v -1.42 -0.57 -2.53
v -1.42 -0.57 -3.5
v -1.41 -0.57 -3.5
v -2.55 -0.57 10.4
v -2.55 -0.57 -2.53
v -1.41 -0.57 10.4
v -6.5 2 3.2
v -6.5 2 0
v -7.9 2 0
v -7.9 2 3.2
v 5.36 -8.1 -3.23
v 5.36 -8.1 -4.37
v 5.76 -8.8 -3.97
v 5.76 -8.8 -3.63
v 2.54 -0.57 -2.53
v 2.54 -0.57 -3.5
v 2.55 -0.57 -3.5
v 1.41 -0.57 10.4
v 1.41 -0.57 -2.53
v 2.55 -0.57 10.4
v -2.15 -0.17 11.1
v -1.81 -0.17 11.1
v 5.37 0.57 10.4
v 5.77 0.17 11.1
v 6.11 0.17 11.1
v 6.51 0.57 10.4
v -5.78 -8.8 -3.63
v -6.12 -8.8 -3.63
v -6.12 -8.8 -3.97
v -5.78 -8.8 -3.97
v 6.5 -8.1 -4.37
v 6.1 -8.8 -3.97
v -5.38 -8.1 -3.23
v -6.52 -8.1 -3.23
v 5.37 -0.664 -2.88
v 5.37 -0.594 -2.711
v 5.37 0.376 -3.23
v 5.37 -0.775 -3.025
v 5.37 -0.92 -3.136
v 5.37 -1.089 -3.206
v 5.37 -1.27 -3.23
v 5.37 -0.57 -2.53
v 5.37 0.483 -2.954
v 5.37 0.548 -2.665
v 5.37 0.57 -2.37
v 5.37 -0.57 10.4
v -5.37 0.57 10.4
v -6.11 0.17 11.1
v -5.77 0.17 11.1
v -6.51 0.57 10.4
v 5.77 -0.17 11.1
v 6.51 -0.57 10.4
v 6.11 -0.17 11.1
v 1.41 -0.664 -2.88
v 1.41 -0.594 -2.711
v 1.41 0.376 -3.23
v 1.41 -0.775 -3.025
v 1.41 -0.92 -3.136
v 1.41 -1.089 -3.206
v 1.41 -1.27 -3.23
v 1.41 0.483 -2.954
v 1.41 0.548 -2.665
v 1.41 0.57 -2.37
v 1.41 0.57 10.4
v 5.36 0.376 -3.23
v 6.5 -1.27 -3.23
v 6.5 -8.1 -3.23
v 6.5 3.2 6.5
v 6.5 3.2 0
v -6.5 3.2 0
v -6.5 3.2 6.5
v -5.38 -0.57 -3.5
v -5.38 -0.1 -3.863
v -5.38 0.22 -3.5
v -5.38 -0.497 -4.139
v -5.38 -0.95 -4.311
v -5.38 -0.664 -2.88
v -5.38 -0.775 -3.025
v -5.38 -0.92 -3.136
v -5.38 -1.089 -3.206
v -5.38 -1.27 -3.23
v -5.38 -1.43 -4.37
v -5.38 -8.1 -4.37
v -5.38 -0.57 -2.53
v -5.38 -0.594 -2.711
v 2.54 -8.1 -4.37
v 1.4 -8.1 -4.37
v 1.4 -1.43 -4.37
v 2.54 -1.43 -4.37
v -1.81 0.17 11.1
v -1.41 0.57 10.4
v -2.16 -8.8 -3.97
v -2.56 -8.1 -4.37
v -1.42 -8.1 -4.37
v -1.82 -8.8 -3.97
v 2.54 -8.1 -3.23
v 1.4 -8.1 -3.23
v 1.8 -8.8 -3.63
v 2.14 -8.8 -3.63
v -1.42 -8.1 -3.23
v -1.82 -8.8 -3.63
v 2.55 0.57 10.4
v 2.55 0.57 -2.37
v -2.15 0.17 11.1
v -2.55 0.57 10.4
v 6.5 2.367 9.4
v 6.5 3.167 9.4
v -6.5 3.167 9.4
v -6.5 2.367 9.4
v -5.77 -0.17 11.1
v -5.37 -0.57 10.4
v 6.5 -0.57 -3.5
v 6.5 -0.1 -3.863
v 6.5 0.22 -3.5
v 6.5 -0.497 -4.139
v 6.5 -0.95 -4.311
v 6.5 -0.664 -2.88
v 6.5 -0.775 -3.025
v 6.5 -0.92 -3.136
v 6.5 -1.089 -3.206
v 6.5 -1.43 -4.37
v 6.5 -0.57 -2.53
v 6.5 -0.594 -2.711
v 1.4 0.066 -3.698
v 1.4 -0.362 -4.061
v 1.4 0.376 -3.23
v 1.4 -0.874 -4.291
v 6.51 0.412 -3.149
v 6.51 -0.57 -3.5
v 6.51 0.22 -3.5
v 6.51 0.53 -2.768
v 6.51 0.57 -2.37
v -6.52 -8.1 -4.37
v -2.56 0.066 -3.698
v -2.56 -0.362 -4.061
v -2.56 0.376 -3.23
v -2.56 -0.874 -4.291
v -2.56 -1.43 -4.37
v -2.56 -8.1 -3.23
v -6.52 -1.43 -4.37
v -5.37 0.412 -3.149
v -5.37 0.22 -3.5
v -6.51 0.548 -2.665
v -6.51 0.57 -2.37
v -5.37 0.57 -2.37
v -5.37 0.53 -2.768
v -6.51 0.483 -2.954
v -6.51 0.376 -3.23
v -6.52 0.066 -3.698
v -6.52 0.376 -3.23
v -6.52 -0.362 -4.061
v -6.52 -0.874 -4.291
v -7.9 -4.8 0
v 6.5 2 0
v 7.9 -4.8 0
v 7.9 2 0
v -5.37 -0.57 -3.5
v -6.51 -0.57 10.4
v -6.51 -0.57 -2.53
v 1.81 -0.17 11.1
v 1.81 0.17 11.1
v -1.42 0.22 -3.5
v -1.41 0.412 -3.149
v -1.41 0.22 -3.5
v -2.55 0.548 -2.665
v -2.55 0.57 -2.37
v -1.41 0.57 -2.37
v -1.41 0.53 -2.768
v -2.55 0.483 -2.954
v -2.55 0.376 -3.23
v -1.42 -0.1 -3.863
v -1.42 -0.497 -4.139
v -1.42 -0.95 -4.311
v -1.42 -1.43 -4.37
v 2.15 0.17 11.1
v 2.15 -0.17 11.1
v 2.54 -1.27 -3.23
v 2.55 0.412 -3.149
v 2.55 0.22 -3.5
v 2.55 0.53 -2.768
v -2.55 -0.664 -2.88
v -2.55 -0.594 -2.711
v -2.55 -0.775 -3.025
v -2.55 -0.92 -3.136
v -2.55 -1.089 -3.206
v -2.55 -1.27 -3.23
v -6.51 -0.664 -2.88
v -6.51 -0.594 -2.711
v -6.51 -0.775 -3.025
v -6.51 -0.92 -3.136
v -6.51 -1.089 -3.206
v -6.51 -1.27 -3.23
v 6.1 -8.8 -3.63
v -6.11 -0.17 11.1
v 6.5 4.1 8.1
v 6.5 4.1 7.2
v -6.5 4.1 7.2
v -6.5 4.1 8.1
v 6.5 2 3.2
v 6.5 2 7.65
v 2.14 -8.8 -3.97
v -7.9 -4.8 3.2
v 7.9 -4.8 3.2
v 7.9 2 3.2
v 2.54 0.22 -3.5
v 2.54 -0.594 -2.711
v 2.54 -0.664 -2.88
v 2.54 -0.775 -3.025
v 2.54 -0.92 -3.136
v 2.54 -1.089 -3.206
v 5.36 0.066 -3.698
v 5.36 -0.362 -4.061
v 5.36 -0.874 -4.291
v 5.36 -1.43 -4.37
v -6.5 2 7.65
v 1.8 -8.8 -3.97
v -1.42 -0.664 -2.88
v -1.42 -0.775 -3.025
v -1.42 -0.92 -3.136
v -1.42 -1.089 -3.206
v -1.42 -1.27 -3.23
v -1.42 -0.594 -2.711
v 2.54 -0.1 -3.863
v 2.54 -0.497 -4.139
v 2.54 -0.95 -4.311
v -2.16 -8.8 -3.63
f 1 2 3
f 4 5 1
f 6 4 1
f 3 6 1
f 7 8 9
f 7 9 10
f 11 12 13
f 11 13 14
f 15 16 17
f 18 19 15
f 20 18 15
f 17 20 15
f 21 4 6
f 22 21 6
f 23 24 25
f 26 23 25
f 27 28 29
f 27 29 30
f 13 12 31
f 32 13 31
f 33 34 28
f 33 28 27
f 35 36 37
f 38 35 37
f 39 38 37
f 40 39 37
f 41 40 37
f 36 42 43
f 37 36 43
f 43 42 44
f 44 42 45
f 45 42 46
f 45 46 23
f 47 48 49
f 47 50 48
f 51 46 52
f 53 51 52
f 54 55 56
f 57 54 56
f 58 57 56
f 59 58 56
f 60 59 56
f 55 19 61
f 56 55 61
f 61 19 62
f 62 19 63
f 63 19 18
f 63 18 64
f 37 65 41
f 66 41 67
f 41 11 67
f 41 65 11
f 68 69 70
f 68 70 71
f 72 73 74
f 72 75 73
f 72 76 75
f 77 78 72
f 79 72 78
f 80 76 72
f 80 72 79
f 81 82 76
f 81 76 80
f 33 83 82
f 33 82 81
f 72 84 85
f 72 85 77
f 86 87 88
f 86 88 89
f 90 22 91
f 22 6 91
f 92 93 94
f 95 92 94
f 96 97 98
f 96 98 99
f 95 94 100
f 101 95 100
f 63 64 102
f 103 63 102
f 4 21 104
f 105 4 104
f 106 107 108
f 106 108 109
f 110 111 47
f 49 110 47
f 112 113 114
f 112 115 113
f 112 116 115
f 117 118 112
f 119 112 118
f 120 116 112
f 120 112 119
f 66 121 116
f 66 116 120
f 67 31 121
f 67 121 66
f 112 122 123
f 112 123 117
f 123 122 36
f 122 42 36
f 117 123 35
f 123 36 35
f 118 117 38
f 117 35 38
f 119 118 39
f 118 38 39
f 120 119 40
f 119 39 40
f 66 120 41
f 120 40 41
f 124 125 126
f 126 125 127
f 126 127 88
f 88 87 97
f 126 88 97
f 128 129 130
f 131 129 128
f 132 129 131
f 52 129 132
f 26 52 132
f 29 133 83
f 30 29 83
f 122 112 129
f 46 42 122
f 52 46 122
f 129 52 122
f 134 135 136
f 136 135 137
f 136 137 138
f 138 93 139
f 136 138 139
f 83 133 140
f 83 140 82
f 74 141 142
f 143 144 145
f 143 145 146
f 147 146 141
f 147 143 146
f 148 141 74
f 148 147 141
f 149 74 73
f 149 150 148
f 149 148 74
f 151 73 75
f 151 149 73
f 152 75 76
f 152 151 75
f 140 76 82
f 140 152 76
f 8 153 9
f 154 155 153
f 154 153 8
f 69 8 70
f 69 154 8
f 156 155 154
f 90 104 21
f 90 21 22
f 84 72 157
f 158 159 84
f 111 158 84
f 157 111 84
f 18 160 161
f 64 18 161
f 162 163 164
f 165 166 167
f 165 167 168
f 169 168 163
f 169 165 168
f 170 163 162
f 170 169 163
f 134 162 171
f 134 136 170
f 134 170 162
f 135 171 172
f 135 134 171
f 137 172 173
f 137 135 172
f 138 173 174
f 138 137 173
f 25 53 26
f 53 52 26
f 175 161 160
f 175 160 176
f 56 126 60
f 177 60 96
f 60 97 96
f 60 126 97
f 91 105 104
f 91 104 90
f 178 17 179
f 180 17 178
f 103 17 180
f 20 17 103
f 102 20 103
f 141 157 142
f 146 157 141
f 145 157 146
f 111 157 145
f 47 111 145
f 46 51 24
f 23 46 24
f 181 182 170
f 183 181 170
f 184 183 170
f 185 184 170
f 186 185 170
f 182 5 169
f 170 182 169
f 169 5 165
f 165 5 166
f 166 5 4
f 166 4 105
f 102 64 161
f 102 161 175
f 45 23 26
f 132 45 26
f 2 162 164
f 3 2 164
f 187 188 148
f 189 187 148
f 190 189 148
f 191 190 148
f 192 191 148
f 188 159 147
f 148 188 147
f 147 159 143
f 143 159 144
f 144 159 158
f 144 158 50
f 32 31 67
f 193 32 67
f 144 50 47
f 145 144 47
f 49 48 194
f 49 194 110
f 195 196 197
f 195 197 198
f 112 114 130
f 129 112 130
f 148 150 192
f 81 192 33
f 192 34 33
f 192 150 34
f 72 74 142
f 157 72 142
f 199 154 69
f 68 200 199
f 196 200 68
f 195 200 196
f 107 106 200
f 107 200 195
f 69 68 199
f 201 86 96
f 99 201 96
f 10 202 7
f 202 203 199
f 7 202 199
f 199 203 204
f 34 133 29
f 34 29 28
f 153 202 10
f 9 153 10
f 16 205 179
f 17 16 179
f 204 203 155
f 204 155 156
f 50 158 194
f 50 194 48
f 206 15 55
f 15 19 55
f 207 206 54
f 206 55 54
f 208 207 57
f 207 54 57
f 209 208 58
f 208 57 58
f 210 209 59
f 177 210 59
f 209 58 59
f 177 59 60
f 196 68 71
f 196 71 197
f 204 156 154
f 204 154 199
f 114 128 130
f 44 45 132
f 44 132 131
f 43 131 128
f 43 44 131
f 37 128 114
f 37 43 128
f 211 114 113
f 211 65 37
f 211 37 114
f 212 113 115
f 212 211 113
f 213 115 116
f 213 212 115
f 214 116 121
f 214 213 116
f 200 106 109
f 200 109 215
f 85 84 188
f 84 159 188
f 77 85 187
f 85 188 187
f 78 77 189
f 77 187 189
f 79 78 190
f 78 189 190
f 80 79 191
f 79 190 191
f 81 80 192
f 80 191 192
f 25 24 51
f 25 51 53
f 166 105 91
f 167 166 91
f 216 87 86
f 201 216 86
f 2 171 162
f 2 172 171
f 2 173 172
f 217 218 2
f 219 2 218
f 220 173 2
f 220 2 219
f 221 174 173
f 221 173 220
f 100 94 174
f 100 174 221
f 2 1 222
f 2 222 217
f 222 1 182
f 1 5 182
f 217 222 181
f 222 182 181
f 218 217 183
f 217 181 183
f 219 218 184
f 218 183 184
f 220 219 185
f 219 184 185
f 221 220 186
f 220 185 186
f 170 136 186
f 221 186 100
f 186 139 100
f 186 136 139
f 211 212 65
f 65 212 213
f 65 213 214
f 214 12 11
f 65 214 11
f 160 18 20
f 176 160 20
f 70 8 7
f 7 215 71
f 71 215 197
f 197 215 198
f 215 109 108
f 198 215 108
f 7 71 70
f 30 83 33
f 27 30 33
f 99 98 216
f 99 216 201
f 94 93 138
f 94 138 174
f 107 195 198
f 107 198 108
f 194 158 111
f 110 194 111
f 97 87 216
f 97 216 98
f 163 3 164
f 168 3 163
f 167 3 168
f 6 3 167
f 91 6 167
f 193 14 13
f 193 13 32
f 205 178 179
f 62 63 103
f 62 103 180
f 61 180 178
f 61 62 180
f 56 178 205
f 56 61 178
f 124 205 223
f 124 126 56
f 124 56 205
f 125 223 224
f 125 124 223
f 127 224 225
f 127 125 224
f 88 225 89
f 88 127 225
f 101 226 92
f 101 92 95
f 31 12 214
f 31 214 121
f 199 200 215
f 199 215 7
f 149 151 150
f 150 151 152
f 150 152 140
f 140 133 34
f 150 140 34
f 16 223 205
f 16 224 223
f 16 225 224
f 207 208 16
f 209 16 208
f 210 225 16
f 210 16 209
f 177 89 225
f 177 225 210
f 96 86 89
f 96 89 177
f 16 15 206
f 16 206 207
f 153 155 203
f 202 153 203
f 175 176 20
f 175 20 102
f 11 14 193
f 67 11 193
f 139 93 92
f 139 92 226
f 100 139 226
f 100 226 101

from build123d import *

# Parameters (mm, degrees)
F0_W          = 6.8
F0_H          = 3.2
F1_DEPTH      = 7.9
F1_DEPTH_BACK = 7.9
F2_DEPTH      = 6.5
F2_DEPTH_BACK = 6.5
F3_W          = 1.14
F3_H          = 1.14
F4_DEPTH      = 11.1
F4_DEPTH_BACK = 3.5
F5_C1_SIZE2   = 0.4
F5_C1_SIZE    = 0.7
F5_C2_SIZE2   = 0.7
F5_C2_SIZE    = 0.4
F5_C3_SIZE2   = 0.7
F5_C3_SIZE    = 0.4
F5_C4_SIZE2   = 0.7
F5_C4_SIZE    = 0.4
F5_2_C1_SIZE2 = 0.4
F5_2_C1_SIZE  = 0.7
F5_2_C2_SIZE2 = 0.7
F5_2_C2_SIZE  = 0.4
F5_2_C3_SIZE2 = 0.7
F5_2_C3_SIZE  = 0.4
F5_2_C4_SIZE2 = 0.7
F5_2_C4_SIZE  = 0.4
F5_3_C1_SIZE2 = 0.4
F5_3_C1_SIZE  = 0.7
F5_3_C2_SIZE2 = 0.7
F5_3_C2_SIZE  = 0.4
F5_3_C3_SIZE2 = 0.7
F5_3_C3_SIZE  = 0.4
F5_3_C4_SIZE2 = 0.7
F5_3_C4_SIZE  = 0.4
F5_4_C1_SIZE2 = 0.4
F5_4_C1_SIZE  = 0.7
F5_4_C2_SIZE2 = 0.7
F5_4_C2_SIZE  = 0.4
F5_4_C3_SIZE2 = 0.7
F5_4_C3_SIZE  = 0.4
F5_4_C4_SIZE2 = 0.7
F5_4_C4_SIZE  = 0.4
F6_W          = 1.14
F6_H          = 1.14
F7_DEPTH      = 8.8
F7_DEPTH_BACK = 0.57
F8_R          = 0.7
F8_2_R        = 0.7
F8_3_R        = 0.7
F8_4_R        = 0.7
F9_T1_DEPTH   = 11.14
F9_2_T1_DEPTH = 11.14
F9_3_T1_DEPTH = 11.14
F9_4_T1_DEPTH = 11.14
F10_SIZE2     = 0.7
F10_SIZE      = 0.4
F10_2_SIZE2   = 0.7
F10_2_SIZE    = 0.4
F10_3_SIZE2   = 0.7
F10_3_SIZE    = 0.4
F10_4_SIZE2   = 0.7
F10_4_SIZE    = 0.4


# Not quite as in the source:
# - a fillet or chamfer that OpenCascade refuses, or shapes differently, is made with other operations: its cross-section is extruded or revolved along the edge and cut away or added


with BuildPart() as f1:
    # F0 (on Right) → F1 (new body, two sides)
    with BuildSketch(Plane.YZ) as f1_sk:
        with Locations((-1.4, 1.6)):
            Rectangle(F0_W, F0_H)
    extrude(amount=F1_DEPTH)
    extrude(f1_sk.sketch, amount=-F1_DEPTH_BACK)

    # F0 (on Right) → F2 (join, two sides)
    with BuildSketch(Plane.YZ) as f2_sk:
        Polygon((2, 3.2), (2, 0), (3.2, 0), (3.2, 6.5), (4.1, 7.2), (4.1, 8.1), (3.1672620947, 9.4), (2.3672620947, 9.4), (2, 7.65), align=None)
    extrude(amount=F2_DEPTH)
    extrude(f2_sk.sketch, amount=-F2_DEPTH_BACK)


with BuildPart() as f4:
    # F3 (on Top) → F4 (new body, two sides)
    with BuildSketch(Plane.XY) as f4_sk:
        with Locations((-5.94, 0)):
            Rectangle(F3_W, F3_H)
    extrude(amount=F4_DEPTH)
    extrude(f4_sk.sketch, amount=-F4_DEPTH_BACK)

    # F5: chamfer of 0.7 x 0.4 on 4 edges, made by hand

    # F5_c1
    f5_c1_edges = [f4.edges().sort_by_distance(p)[0] for p in [
        (-5.94, -0.57, 11.1),
    ]]
    f5_c1_side = f4.faces().sort_by_distance((-5.94, -0.57, 11.092))[0]
    chamfer(f5_c1_edges, length=F5_C1_SIZE, length2=F5_C1_SIZE2, reference=f5_c1_side)

    # F5_c2
    f5_c2_edges = [f4.edges().sort_by_distance(p)[0] for p in [
        (-5.94, 0.57, 11.1),
    ]]
    f5_c2_side = f4.faces().sort_by_distance((-5.94, 0.562, 11.1))[0]
    chamfer(f5_c2_edges, length=F5_C2_SIZE, length2=F5_C2_SIZE2, reference=f5_c2_side)

    # F5_c3
    f5_c3_edges = [f4.edges().sort_by_distance(p)[0] for p in [
        (-5.37, 0, 11.1),
    ]]
    f5_c3_side = f4.faces().sort_by_distance((-5.378, 0, 11.1))[0]
    chamfer(f5_c3_edges, length=F5_C3_SIZE, length2=F5_C3_SIZE2, reference=f5_c3_side)

    # F5_c4
    f5_c4_edges = [f4.edges().sort_by_distance(p)[0] for p in [
        (-6.51, 0, 11.1),
    ]]
    f5_c4_side = f4.faces().sort_by_distance((-6.502, 0, 11.1))[0]
    chamfer(f5_c4_edges, length=F5_C4_SIZE, length2=F5_C4_SIZE2, reference=f5_c4_side)

    # F6 (on Front) → F7, piece 4 (join, two sides)
    with BuildSketch(Plane.XZ) as f7_4_sk:
        with Locations((-5.95, -3.8)):
            Rectangle(F6_W, F6_H)
    extrude(amount=F7_DEPTH)
    extrude(f7_4_sk.sketch, amount=-F7_DEPTH_BACK)

    # F8
    f8_edges = [f4.edges().sort_by_distance(p)[0] for p in [
        (-5.945, -0.57, -3.23),
    ]]
    fillet(f8_edges, radius=F8_R)

    # F9: fillet of radius 2 on 1 edges, made by hand

    # F9_s2 → F9_t1 (cut)
    with BuildSketch(Plane.YZ.offset(-11.52)):
        with BuildLine():
            ThreePointArc((0.57, -2.37), (-0.0157864376, -3.7842135624), (-1.43, -4.37))
            Line((-1.43, -4.37), (0.57, -4.37))
            Line((0.57, -4.37), (0.57, -2.37))
        make_face()
    extrude(amount=F9_T1_DEPTH, mode=Mode.SUBTRACT)

    # F10
    f10_edges = [f4.edges().sort_by_distance(p)[0] for p in [
        (-5.38, -8.8, -3.8),
        (-5.95, -8.8, -3.23),
        (-6.52, -8.8, -3.8),
        (-5.95, -8.8, -4.37),
    ]]
    f10_side = f4.faces().sort_by_distance((-5.95, -8.8, -3.8))[0]
    chamfer(f10_edges, length=F10_SIZE, length2=F10_SIZE2, reference=f10_side)


with BuildPart() as f4b:
    # F3 (on Top) → F4, piece 2 (new body, two sides)
    with BuildSketch(Plane.XY) as f4_2_sk:
        with Locations((-1.98, 0)):
            Rectangle(F3_W, F3_H)
    extrude(amount=F4_DEPTH)
    extrude(f4_2_sk.sketch, amount=-F4_DEPTH_BACK)

    # F5#2: chamfer of 0.7 x 0.4 on 4 edges, made by hand

    # F5_2_c1
    f5_2_c1_edges = [f4b.edges().sort_by_distance(p)[0] for p in [
        (-2.55, 0, 11.1),
    ]]
    f5_2_c1_side = f4b.faces().sort_by_distance((-2.55, 0, 11.092))[0]
    chamfer(f5_2_c1_edges, length=F5_2_C1_SIZE, length2=F5_2_C1_SIZE2, reference=f5_2_c1_side)

    # F5_2_c2
    f5_2_c2_edges = [f4b.edges().sort_by_distance(p)[0] for p in [
        (-1.41, 0, 11.1),
    ]]
    f5_2_c2_side = f4b.faces().sort_by_distance((-1.418, 0, 11.1))[0]
    chamfer(f5_2_c2_edges, length=F5_2_C2_SIZE, length2=F5_2_C2_SIZE2, reference=f5_2_c2_side)

    # F5_2_c3
    f5_2_c3_edges = [f4b.edges().sort_by_distance(p)[0] for p in [
        (-1.98, -0.57, 11.1),
    ]]
    f5_2_c3_side = f4b.faces().sort_by_distance((-1.98, -0.562, 11.1))[0]
    chamfer(f5_2_c3_edges, length=F5_2_C3_SIZE, length2=F5_2_C3_SIZE2, reference=f5_2_c3_side)

    # F5_2_c4
    f5_2_c4_edges = [f4b.edges().sort_by_distance(p)[0] for p in [
        (-1.98, 0.57, 11.1),
    ]]
    f5_2_c4_side = f4b.faces().sort_by_distance((-1.98, 0.562, 11.1))[0]
    chamfer(f5_2_c4_edges, length=F5_2_C4_SIZE, length2=F5_2_C4_SIZE2, reference=f5_2_c4_side)

    # F6 (on Front) → F7, piece 3 (join, two sides)
    with BuildSketch(Plane.XZ) as f7_3_sk:
        with Locations((-1.99, -3.8)):
            Rectangle(F6_W, F6_H)
    extrude(amount=F7_DEPTH)
    extrude(f7_3_sk.sketch, amount=-F7_DEPTH_BACK)

    # F8#2
    f8_2_edges = [f4b.edges().sort_by_distance(p)[0] for p in [
        (-1.985, -0.57, -3.23),
    ]]
    fillet(f8_2_edges, radius=F8_2_R)

    # F9#2: fillet of radius 2 on 1 edges, made by hand

    # F9_2_s2 → F9_2_t1 (cut)
    with BuildSketch(Plane.YZ.offset(-7.56)):
        with BuildLine():
            ThreePointArc((0.57, -2.37), (-0.0157864376, -3.7842135624), (-1.43, -4.37))
            Line((-1.43, -4.37), (0.57, -4.37))
            Line((0.57, -4.37), (0.57, -2.37))
        make_face()
    extrude(amount=F9_2_T1_DEPTH, mode=Mode.SUBTRACT)

    # F10#2
    f10_2_edges = [f4b.edges().sort_by_distance(p)[0] for p in [
        (-1.42, -8.8, -3.8),
        (-1.99, -8.8, -3.23),
        (-2.56, -8.8, -3.8),
        (-1.99, -8.8, -4.37),
    ]]
    f10_2_side = f4b.faces().sort_by_distance((-1.99, -8.8, -3.8))[0]
    chamfer(f10_2_edges, length=F10_2_SIZE, length2=F10_2_SIZE2, reference=f10_2_side)


with BuildPart() as f4c:
    # F3 (on Top) → F4, piece 3 (new body, two sides)
    with BuildSketch(Plane.XY) as f4_3_sk:
        with Locations((1.98, 0)):
            Rectangle(F3_W, F3_H)
    extrude(amount=F4_DEPTH)
    extrude(f4_3_sk.sketch, amount=-F4_DEPTH_BACK)

    # F5#3: chamfer of 0.7 x 0.4 on 4 edges, made by hand

    # F5_3_c1
    f5_3_c1_edges = [f4c.edges().sort_by_distance(p)[0] for p in [
        (1.41, 0, 11.1),
    ]]
    f5_3_c1_side = f4c.faces().sort_by_distance((1.41, 0, 11.092))[0]
    chamfer(f5_3_c1_edges, length=F5_3_C1_SIZE, length2=F5_3_C1_SIZE2, reference=f5_3_c1_side)

    # F5_3_c2
    f5_3_c2_edges = [f4c.edges().sort_by_distance(p)[0] for p in [
        (2.55, 0, 11.1),
    ]]
    f5_3_c2_side = f4c.faces().sort_by_distance((2.542, 0, 11.1))[0]
    chamfer(f5_3_c2_edges, length=F5_3_C2_SIZE, length2=F5_3_C2_SIZE2, reference=f5_3_c2_side)

    # F5_3_c3
    f5_3_c3_edges = [f4c.edges().sort_by_distance(p)[0] for p in [
        (1.98, -0.57, 11.1),
    ]]
    f5_3_c3_side = f4c.faces().sort_by_distance((1.98, -0.562, 11.1))[0]
    chamfer(f5_3_c3_edges, length=F5_3_C3_SIZE, length2=F5_3_C3_SIZE2, reference=f5_3_c3_side)

    # F5_3_c4
    f5_3_c4_edges = [f4c.edges().sort_by_distance(p)[0] for p in [
        (1.98, 0.57, 11.1),
    ]]
    f5_3_c4_side = f4c.faces().sort_by_distance((1.98, 0.562, 11.1))[0]
    chamfer(f5_3_c4_edges, length=F5_3_C4_SIZE, length2=F5_3_C4_SIZE2, reference=f5_3_c4_side)

    # F6 (on Front) → F7, piece 2 (join, two sides)
    with BuildSketch(Plane.XZ) as f7_2_sk:
        with Locations((1.97, -3.8)):
            Rectangle(F6_W, F6_H)
    extrude(amount=F7_DEPTH)
    extrude(f7_2_sk.sketch, amount=-F7_DEPTH_BACK)

    # F8#3
    f8_3_edges = [f4c.edges().sort_by_distance(p)[0] for p in [
        (1.975, -0.57, -3.23),
    ]]
    fillet(f8_3_edges, radius=F8_3_R)

    # F9#3: fillet of radius 2 on 1 edges, made by hand

    # F9_3_s2 → F9_3_t1 (cut)
    with BuildSketch(Plane.YZ.offset(-3.6)):
        with BuildLine():
            ThreePointArc((0.57, -2.37), (-0.0157864376, -3.7842135624), (-1.43, -4.37))
            Line((-1.43, -4.37), (0.57, -4.37))
            Line((0.57, -4.37), (0.57, -2.37))
        make_face()
    extrude(amount=F9_3_T1_DEPTH, mode=Mode.SUBTRACT)

    # F10#3
    f10_3_edges = [f4c.edges().sort_by_distance(p)[0] for p in [
        (2.54, -8.8, -3.8),
        (1.97, -8.8, -3.23),
        (1.4, -8.8, -3.8),
        (1.97, -8.8, -4.37),
    ]]
    f10_3_side = f4c.faces().sort_by_distance((1.97, -8.8, -3.8))[0]
    chamfer(f10_3_edges, length=F10_3_SIZE, length2=F10_3_SIZE2, reference=f10_3_side)


with BuildPart() as f4d:
    # F3 (on Top) → F4, piece 4 (new body, two sides)
    with BuildSketch(Plane.XY) as f4_4_sk:
        with Locations((5.94, 0)):
            Rectangle(F3_W, F3_H)
    extrude(amount=F4_DEPTH)
    extrude(f4_4_sk.sketch, amount=-F4_DEPTH_BACK)

    # F5#4: chamfer of 0.7 x 0.4 on 4 edges, made by hand

    # F5_4_c1
    f5_4_c1_edges = [f4d.edges().sort_by_distance(p)[0] for p in [
        (5.37, 0, 11.1),
    ]]
    f5_4_c1_side = f4d.faces().sort_by_distance((5.37, 0, 11.092))[0]
    chamfer(f5_4_c1_edges, length=F5_4_C1_SIZE, length2=F5_4_C1_SIZE2, reference=f5_4_c1_side)

    # F5_4_c2
    f5_4_c2_edges = [f4d.edges().sort_by_distance(p)[0] for p in [
        (6.51, 0, 11.1),
    ]]
    f5_4_c2_side = f4d.faces().sort_by_distance((6.502, 0, 11.1))[0]
    chamfer(f5_4_c2_edges, length=F5_4_C2_SIZE, length2=F5_4_C2_SIZE2, reference=f5_4_c2_side)

    # F5_4_c3
    f5_4_c3_edges = [f4d.edges().sort_by_distance(p)[0] for p in [
        (5.94, -0.57, 11.1),
    ]]
    f5_4_c3_side = f4d.faces().sort_by_distance((5.94, -0.562, 11.1))[0]
    chamfer(f5_4_c3_edges, length=F5_4_C3_SIZE, length2=F5_4_C3_SIZE2, reference=f5_4_c3_side)

    # F5_4_c4
    f5_4_c4_edges = [f4d.edges().sort_by_distance(p)[0] for p in [
        (5.94, 0.57, 11.1),
    ]]
    f5_4_c4_side = f4d.faces().sort_by_distance((5.94, 0.562, 11.1))[0]
    chamfer(f5_4_c4_edges, length=F5_4_C4_SIZE, length2=F5_4_C4_SIZE2, reference=f5_4_c4_side)

    # F6 (on Front) → F7 (join, two sides)
    with BuildSketch(Plane.XZ) as f7_sk:
        with Locations((5.93, -3.8)):
            Rectangle(F6_W, F6_H)
    extrude(amount=F7_DEPTH)
    extrude(f7_sk.sketch, amount=-F7_DEPTH_BACK)

    # F8#4
    f8_4_edges = [f4d.edges().sort_by_distance(p)[0] for p in [
        (5.935, -0.57, -3.23),
    ]]
    fillet(f8_4_edges, radius=F8_4_R)

    # F9#4: fillet of radius 2 on 1 edges, made by hand

    # F9_4_s2 → F9_4_t1 (cut)
    with BuildSketch(Plane.YZ.offset(0.36)):
        with BuildLine():
            ThreePointArc((0.57, -2.37), (-0.0157864376, -3.7842135624), (-1.43, -4.37))
            Line((-1.43, -4.37), (0.57, -4.37))
            Line((0.57, -4.37), (0.57, -2.37))
        make_face()
    extrude(amount=F9_4_T1_DEPTH, mode=Mode.SUBTRACT)

    # F10#4
    f10_4_edges = [f4d.edges().sort_by_distance(p)[0] for p in [
        (6.5, -8.8, -3.8),
        (5.93, -8.8, -3.23),
        (5.36, -8.8, -3.8),
        (5.93, -8.8, -4.37),
    ]]
    f10_4_side = f4d.faces().sort_by_distance((5.93, -8.8, -3.8))[0]
    chamfer(f10_4_edges, length=F10_4_SIZE, length2=F10_4_SIZE2, reference=f10_4_side)


solid = Compound([f1.part, f4.part, f4b.part, f4c.part, f4d.part])
